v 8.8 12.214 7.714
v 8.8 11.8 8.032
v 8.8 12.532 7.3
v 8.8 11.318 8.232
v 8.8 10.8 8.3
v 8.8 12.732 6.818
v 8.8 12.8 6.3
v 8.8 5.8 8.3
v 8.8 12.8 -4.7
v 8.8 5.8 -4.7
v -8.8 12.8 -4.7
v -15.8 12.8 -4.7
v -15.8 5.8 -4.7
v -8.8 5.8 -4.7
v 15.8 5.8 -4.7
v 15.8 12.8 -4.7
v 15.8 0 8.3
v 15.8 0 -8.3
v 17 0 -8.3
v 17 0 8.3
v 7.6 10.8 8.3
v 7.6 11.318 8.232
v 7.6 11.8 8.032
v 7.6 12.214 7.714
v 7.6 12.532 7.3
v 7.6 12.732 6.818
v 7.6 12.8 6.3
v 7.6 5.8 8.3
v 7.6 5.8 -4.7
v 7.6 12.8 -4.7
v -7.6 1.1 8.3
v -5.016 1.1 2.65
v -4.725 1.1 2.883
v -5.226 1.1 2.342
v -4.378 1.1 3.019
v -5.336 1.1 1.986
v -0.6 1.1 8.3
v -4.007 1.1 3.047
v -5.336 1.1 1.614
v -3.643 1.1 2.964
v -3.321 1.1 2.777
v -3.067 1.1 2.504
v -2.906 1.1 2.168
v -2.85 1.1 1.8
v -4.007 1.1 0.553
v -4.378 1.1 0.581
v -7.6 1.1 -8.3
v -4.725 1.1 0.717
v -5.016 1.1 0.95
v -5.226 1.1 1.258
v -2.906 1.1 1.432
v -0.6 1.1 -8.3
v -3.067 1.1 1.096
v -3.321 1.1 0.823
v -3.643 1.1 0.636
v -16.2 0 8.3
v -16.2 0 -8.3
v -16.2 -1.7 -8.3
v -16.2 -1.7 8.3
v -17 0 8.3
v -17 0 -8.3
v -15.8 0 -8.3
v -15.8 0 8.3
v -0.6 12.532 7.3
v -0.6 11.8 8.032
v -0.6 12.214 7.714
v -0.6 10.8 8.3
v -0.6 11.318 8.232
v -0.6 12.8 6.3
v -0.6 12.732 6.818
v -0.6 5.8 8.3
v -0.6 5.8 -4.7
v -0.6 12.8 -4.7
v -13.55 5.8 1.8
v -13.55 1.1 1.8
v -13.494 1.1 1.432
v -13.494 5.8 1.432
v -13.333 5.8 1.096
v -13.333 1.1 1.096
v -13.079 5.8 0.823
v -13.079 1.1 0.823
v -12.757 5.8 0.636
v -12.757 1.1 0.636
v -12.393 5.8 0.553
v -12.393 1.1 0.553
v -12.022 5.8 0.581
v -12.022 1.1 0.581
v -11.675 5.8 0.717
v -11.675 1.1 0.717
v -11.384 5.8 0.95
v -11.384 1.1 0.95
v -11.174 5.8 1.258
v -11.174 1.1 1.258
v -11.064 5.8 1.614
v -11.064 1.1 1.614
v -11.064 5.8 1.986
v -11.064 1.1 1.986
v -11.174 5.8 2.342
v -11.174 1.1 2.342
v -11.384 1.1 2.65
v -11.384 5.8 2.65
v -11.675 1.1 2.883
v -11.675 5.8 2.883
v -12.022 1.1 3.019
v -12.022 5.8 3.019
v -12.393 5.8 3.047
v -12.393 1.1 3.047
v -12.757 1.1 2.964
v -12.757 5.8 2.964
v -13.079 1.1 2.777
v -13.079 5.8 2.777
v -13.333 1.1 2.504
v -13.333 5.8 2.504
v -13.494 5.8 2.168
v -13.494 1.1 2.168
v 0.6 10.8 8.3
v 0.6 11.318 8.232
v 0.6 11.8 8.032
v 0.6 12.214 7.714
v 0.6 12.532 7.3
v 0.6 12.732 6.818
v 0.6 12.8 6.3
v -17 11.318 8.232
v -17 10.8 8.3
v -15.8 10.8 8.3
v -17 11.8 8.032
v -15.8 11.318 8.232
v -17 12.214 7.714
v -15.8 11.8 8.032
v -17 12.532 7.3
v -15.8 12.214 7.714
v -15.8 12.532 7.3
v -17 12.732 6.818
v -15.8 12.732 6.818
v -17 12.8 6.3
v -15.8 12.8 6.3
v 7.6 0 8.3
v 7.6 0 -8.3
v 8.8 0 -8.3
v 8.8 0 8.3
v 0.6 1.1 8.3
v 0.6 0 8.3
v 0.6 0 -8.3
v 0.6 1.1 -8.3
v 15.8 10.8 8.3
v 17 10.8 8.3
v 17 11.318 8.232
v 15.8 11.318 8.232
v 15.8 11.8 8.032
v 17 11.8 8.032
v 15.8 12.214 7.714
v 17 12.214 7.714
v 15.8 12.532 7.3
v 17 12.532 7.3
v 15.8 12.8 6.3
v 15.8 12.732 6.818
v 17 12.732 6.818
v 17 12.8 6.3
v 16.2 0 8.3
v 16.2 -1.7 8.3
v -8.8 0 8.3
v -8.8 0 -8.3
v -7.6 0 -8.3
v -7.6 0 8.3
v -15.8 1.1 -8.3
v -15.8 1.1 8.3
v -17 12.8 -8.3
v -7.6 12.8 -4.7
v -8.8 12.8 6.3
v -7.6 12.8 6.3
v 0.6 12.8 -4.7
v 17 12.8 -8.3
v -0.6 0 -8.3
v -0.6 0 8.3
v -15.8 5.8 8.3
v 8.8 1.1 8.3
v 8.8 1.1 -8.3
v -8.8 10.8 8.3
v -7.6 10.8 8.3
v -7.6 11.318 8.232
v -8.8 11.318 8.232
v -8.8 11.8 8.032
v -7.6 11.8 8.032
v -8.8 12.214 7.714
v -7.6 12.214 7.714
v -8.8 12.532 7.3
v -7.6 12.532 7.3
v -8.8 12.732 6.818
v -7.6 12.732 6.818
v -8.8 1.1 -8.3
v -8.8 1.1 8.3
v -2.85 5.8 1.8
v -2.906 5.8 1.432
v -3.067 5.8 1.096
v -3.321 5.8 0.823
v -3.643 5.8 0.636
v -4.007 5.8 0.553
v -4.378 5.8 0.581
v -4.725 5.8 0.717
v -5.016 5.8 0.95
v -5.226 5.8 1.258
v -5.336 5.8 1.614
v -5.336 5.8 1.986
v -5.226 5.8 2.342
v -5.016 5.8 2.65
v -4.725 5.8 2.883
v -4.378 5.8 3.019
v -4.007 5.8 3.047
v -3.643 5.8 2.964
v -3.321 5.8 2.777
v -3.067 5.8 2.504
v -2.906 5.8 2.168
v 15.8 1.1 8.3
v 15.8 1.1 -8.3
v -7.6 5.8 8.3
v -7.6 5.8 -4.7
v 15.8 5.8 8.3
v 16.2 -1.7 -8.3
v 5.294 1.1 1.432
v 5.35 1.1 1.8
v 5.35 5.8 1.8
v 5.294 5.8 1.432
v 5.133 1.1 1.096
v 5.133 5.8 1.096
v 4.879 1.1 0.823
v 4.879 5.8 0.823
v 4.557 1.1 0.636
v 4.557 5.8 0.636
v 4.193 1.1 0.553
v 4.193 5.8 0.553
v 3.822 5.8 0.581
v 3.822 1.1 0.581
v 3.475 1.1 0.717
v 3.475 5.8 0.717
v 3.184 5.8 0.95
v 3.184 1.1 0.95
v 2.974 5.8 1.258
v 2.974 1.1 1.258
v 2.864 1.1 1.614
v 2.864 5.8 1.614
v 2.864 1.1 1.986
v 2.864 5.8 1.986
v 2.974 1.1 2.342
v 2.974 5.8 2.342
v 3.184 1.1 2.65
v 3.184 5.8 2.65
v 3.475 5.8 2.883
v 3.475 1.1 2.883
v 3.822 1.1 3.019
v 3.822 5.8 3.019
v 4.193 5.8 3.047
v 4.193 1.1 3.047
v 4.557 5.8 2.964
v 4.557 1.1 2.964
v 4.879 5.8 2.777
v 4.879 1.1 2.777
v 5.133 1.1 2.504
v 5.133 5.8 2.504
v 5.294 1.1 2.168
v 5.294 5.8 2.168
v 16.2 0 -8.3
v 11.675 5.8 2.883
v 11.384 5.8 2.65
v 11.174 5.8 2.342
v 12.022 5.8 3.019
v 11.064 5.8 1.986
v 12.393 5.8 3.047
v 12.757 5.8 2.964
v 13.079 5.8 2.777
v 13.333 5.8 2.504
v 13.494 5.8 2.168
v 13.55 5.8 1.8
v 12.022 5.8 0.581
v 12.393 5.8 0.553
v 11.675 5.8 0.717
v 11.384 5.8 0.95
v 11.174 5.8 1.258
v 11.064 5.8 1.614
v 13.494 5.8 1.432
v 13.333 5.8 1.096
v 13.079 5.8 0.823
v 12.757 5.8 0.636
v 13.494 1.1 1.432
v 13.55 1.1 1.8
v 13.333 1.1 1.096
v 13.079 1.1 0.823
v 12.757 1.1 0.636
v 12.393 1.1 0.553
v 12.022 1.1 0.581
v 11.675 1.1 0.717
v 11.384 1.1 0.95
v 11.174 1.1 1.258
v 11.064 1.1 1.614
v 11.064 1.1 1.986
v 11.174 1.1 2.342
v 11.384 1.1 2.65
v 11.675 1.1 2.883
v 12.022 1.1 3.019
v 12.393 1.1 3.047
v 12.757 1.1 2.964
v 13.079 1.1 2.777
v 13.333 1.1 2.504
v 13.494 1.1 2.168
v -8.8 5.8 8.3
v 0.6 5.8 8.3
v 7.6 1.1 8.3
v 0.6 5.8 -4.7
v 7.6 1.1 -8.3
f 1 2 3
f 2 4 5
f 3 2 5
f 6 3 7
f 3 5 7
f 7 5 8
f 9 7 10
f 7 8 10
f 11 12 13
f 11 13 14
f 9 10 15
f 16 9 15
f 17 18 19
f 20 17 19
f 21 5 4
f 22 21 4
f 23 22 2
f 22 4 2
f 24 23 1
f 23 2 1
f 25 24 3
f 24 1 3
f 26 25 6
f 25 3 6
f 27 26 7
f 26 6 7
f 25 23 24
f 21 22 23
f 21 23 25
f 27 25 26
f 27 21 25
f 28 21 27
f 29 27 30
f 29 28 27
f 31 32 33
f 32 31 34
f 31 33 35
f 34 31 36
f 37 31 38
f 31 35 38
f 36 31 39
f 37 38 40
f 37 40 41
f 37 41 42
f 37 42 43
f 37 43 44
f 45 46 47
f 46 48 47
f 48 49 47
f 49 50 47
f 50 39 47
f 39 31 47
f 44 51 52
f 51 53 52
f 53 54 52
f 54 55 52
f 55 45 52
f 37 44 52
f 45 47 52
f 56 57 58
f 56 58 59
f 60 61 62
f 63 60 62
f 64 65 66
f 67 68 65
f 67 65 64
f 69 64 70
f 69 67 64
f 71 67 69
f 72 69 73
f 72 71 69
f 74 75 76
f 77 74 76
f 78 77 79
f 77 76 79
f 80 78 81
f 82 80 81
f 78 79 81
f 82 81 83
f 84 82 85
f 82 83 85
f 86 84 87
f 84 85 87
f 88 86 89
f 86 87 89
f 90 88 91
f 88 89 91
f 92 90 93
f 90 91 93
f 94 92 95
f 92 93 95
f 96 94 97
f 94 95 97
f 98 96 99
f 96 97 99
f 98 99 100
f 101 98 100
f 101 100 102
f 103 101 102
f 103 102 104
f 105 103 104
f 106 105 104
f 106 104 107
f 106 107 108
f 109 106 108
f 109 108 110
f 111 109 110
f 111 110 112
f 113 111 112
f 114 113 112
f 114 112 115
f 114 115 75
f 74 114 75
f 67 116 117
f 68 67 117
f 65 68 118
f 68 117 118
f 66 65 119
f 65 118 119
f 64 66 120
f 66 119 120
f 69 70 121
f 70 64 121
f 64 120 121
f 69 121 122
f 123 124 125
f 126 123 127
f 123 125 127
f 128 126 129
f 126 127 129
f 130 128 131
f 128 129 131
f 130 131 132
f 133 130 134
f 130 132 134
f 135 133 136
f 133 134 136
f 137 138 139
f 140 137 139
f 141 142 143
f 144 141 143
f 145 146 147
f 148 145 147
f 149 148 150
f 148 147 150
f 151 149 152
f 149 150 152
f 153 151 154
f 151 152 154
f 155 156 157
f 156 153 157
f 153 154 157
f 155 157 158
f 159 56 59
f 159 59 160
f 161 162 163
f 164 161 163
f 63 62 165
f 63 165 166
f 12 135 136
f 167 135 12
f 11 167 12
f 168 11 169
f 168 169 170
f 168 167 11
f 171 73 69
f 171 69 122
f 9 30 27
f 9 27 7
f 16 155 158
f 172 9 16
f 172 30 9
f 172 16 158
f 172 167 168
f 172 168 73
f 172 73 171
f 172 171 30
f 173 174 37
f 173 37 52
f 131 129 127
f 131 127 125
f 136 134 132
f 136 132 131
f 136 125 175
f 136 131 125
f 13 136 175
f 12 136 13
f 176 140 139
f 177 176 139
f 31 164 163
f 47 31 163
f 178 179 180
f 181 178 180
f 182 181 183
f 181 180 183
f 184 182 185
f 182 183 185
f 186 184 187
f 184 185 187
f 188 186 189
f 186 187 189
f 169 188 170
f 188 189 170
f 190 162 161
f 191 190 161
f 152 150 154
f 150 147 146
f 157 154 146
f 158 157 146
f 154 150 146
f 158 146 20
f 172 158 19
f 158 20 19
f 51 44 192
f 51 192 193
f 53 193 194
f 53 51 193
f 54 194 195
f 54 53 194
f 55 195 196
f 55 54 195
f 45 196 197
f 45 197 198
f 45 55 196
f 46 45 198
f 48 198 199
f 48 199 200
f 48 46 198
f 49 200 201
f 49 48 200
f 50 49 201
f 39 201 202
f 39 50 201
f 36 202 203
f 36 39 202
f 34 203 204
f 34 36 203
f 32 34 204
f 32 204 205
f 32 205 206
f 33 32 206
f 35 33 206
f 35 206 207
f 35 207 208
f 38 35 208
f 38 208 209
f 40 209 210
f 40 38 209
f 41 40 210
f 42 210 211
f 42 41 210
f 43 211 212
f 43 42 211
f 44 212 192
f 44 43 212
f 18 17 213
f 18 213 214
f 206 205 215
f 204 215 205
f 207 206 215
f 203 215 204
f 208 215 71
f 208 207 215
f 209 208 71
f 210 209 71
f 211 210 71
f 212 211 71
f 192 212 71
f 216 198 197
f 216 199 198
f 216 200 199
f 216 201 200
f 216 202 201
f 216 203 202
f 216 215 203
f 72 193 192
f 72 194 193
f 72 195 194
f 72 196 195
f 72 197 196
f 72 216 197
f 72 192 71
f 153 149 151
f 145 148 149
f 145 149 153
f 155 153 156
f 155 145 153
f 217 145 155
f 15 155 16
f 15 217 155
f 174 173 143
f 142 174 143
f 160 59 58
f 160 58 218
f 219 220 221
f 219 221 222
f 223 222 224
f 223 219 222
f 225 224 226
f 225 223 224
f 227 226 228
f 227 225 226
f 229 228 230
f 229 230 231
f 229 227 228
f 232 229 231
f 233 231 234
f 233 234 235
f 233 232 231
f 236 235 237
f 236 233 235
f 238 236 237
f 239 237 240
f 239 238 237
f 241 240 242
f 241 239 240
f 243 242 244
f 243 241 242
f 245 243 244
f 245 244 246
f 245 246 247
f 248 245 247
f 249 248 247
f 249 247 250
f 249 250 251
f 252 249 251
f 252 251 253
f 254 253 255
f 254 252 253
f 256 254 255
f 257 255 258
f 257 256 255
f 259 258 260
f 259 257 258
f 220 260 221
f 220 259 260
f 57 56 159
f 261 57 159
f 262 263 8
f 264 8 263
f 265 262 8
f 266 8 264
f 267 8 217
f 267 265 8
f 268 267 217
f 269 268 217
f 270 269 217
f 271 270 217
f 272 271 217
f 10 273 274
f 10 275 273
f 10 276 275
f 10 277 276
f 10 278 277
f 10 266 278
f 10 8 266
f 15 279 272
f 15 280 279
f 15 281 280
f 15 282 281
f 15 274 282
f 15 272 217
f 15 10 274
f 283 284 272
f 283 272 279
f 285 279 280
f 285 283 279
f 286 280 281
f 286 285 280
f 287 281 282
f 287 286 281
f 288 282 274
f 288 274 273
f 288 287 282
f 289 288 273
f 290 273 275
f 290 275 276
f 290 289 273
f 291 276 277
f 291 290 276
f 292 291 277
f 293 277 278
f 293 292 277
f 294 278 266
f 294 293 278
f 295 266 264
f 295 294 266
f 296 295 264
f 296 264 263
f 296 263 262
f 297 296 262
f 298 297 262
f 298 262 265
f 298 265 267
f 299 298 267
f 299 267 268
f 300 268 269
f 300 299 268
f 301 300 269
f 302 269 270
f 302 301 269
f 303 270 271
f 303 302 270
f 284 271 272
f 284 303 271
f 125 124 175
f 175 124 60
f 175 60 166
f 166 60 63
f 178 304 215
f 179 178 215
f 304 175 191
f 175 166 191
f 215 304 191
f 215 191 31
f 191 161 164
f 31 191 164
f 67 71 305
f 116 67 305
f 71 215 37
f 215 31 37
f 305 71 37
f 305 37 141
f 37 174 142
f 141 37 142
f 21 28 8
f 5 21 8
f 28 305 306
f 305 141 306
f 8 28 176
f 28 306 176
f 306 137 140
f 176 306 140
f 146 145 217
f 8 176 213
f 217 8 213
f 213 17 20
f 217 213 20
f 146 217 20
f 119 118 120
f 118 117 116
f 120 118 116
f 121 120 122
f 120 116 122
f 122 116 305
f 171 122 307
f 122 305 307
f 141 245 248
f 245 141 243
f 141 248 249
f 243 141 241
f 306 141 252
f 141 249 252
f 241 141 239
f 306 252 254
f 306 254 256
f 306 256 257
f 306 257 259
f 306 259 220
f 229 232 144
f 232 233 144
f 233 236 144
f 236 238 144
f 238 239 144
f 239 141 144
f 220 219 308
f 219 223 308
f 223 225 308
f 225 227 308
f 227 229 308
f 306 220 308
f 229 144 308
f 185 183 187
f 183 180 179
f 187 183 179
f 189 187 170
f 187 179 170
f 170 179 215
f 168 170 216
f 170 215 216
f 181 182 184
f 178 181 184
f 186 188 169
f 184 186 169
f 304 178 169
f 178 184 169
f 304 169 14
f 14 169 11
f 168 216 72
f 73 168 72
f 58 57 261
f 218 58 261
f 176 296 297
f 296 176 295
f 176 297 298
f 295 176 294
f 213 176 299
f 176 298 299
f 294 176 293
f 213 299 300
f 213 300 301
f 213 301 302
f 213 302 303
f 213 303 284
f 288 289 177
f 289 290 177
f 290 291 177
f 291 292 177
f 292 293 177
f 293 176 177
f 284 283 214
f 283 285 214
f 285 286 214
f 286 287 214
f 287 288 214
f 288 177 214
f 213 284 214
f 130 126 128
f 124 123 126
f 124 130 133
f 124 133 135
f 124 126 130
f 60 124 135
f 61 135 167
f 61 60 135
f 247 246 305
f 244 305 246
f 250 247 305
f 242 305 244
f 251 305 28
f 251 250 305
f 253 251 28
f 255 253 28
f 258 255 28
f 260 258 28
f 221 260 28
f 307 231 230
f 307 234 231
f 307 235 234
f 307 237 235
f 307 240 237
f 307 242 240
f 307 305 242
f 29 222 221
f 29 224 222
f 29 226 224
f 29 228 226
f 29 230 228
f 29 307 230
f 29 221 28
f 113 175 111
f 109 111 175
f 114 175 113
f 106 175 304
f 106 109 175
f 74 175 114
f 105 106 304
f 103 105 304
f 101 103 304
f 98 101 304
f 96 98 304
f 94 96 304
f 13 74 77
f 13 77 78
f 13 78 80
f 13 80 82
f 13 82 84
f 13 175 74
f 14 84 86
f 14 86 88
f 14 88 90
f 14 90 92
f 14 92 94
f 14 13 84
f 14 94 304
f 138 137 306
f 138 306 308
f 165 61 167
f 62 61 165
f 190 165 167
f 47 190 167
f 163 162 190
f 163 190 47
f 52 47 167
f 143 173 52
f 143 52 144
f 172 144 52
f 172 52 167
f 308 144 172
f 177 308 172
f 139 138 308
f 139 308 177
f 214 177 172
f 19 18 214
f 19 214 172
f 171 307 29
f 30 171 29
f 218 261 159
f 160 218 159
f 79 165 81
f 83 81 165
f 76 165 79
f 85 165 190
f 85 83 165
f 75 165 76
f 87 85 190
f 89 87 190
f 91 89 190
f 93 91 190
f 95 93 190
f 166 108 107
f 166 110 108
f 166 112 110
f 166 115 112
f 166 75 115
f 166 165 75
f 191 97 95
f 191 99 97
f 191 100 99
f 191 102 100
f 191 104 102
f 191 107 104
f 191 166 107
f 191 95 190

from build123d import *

# Parameters (mm, degrees)
SKETCH1_W                 = 34
SKETCH1_H                 = 16.6
BOSS_EXTRUDE1_DEPTH       = 12.8
SKETCH2_W                 = 7
SKETCH2_H                 = 16.6
CUT_EXTRUDE1_DEPTH        = 1.1
FILL_PATTERN1_OUTLINE_W   = 7
FILL_PATTERN1_OUTLINE_H   = 16.6
FILL_PATTERN1_DEPTH       = 1.1
FILLET1_R                 = 2
SKETCH3_W                 = 7
SKETCH3_H                 = 13
CUT_EXTRUDE2_DEPTH        = 7
M3X0_5_TAPPED_HOLE1_D     = 2.5
FILL_START                = 5.8
FILL_PATTERN2_OUTLINE_W   = 7
FILL_PATTERN2_OUTLINE_H   = 13
FILL_PATTERN2_DEPTH       = 7
FILL_START_2              = 1.1
FILL_PATTERN2_2_OUTLINE_R = 1.25
FILL_PATTERN2_2_DEPTH     = 4.7
SKETCH4_W                 = 32.4
SKETCH4_H                 = 16.6
BOSS_EXTRUDE2_DEPTH       = 1.7


# Read off the part's stored shape, not the designer's step: Fill Pattern1, Fill Pattern2
with BuildPart() as part:
    # Sketch1 → Boss-Extrude1 (new body)
    with BuildSketch(Plane(origin=(0, 0, 0), x_dir=(1, 0, 0), z_dir=(0, 1, 0))):
        Rectangle(SKETCH1_W, SKETCH1_H)
    extrude(amount=BOSS_EXTRUDE1_DEPTH)

    # Sketch2 → Cut-Extrude1 (cut)
    with BuildSketch(Plane.XZ):
        with Locations((-12.3, 0)):
            Rectangle(SKETCH2_W, SKETCH2_H)
    extrude(amount=-CUT_EXTRUDE1_DEPTH, mode=Mode.SUBTRACT)

    # Fill Pattern1 outline → Fill Pattern1 (cut)
    with BuildSketch(Plane(origin=(0, 0, 0), x_dir=(1, 0, 0), z_dir=(0, 1, 0))):
        with Locations((12.3, 0)):
            Rectangle(FILL_PATTERN1_OUTLINE_W, FILL_PATTERN1_OUTLINE_H)
        with Locations((4.1, 0)):
            Rectangle(FILL_PATTERN1_OUTLINE_W, FILL_PATTERN1_OUTLINE_H)
        with Locations((-4.1, 0)):
            Rectangle(FILL_PATTERN1_OUTLINE_W, FILL_PATTERN1_OUTLINE_H)
    extrude(amount=FILL_PATTERN1_DEPTH, mode=Mode.SUBTRACT)

    # Fillet1
    fillet1_edges = [part.edges().sort_by_distance(p)[0] for p in [
        (0, 12.8, 8.3),
    ]]
    fillet(fillet1_edges, radius=FILLET1_R)

    # Sketch3 → Cut-Extrude2 (cut)
    with BuildSketch(Plane(origin=(0, 12.8, 0), x_dir=(1, 0, 0), z_dir=(0, 1, 0))):
        with Locations((-12.3, -1.8)):
            Rectangle(SKETCH3_W, SKETCH3_H)
    extrude(amount=-CUT_EXTRUDE2_DEPTH, mode=Mode.SUBTRACT)

    # M3x0.5 Tapped Hole1 (through all)
    with Locations(Plane(origin=(0, 5.8, 0), x_dir=(1, 0, 0), z_dir=(0, 1, 0))):
        with Locations((-12.3, -1.8)):
            Hole(M3X0_5_TAPPED_HOLE1_D / 2)

    # Fill Pattern2 outline → Fill Pattern2 (cut)
    with BuildSketch(Plane(origin=(0, 0, 0), x_dir=(1, 0, 0), z_dir=(0, 1, 0)).offset(FILL_START)):
        with Locations((12.3, -1.8)):
            Rectangle(FILL_PATTERN2_OUTLINE_W, FILL_PATTERN2_OUTLINE_H)
        with Locations((-4.1, -1.8)):
            Rectangle(FILL_PATTERN2_OUTLINE_W, FILL_PATTERN2_OUTLINE_H)
        with Locations((4.1, -1.8)):
            Rectangle(FILL_PATTERN2_OUTLINE_W, FILL_PATTERN2_OUTLINE_H)
    extrude(amount=FILL_PATTERN2_DEPTH, mode=Mode.SUBTRACT)

    # Fill Pattern2 2 outline → Fill Pattern2 2 (cut)
    with BuildSketch(Plane(origin=(0, 0, 0), x_dir=(1, 0, 0), z_dir=(0, 1, 0)).offset(FILL_START_2)):
        with Locations((12.3, -1.8)):
            Circle(FILL_PATTERN2_2_OUTLINE_R)
        with Locations((4.1, -1.8)):
            Circle(FILL_PATTERN2_2_OUTLINE_R)
        with Locations((-4.1, -1.8)):
            Circle(FILL_PATTERN2_2_OUTLINE_R)
    extrude(amount=FILL_PATTERN2_2_DEPTH, mode=Mode.SUBTRACT)


with BuildPart() as body_2:
    # Sketch4 → Boss-Extrude2 (new body)
    with BuildSketch(Plane.XZ):
        Rectangle(SKETCH4_W, SKETCH4_H)
    extrude(amount=BOSS_EXTRUDE2_DEPTH)


solid = Compound([part.part, body_2.part])
